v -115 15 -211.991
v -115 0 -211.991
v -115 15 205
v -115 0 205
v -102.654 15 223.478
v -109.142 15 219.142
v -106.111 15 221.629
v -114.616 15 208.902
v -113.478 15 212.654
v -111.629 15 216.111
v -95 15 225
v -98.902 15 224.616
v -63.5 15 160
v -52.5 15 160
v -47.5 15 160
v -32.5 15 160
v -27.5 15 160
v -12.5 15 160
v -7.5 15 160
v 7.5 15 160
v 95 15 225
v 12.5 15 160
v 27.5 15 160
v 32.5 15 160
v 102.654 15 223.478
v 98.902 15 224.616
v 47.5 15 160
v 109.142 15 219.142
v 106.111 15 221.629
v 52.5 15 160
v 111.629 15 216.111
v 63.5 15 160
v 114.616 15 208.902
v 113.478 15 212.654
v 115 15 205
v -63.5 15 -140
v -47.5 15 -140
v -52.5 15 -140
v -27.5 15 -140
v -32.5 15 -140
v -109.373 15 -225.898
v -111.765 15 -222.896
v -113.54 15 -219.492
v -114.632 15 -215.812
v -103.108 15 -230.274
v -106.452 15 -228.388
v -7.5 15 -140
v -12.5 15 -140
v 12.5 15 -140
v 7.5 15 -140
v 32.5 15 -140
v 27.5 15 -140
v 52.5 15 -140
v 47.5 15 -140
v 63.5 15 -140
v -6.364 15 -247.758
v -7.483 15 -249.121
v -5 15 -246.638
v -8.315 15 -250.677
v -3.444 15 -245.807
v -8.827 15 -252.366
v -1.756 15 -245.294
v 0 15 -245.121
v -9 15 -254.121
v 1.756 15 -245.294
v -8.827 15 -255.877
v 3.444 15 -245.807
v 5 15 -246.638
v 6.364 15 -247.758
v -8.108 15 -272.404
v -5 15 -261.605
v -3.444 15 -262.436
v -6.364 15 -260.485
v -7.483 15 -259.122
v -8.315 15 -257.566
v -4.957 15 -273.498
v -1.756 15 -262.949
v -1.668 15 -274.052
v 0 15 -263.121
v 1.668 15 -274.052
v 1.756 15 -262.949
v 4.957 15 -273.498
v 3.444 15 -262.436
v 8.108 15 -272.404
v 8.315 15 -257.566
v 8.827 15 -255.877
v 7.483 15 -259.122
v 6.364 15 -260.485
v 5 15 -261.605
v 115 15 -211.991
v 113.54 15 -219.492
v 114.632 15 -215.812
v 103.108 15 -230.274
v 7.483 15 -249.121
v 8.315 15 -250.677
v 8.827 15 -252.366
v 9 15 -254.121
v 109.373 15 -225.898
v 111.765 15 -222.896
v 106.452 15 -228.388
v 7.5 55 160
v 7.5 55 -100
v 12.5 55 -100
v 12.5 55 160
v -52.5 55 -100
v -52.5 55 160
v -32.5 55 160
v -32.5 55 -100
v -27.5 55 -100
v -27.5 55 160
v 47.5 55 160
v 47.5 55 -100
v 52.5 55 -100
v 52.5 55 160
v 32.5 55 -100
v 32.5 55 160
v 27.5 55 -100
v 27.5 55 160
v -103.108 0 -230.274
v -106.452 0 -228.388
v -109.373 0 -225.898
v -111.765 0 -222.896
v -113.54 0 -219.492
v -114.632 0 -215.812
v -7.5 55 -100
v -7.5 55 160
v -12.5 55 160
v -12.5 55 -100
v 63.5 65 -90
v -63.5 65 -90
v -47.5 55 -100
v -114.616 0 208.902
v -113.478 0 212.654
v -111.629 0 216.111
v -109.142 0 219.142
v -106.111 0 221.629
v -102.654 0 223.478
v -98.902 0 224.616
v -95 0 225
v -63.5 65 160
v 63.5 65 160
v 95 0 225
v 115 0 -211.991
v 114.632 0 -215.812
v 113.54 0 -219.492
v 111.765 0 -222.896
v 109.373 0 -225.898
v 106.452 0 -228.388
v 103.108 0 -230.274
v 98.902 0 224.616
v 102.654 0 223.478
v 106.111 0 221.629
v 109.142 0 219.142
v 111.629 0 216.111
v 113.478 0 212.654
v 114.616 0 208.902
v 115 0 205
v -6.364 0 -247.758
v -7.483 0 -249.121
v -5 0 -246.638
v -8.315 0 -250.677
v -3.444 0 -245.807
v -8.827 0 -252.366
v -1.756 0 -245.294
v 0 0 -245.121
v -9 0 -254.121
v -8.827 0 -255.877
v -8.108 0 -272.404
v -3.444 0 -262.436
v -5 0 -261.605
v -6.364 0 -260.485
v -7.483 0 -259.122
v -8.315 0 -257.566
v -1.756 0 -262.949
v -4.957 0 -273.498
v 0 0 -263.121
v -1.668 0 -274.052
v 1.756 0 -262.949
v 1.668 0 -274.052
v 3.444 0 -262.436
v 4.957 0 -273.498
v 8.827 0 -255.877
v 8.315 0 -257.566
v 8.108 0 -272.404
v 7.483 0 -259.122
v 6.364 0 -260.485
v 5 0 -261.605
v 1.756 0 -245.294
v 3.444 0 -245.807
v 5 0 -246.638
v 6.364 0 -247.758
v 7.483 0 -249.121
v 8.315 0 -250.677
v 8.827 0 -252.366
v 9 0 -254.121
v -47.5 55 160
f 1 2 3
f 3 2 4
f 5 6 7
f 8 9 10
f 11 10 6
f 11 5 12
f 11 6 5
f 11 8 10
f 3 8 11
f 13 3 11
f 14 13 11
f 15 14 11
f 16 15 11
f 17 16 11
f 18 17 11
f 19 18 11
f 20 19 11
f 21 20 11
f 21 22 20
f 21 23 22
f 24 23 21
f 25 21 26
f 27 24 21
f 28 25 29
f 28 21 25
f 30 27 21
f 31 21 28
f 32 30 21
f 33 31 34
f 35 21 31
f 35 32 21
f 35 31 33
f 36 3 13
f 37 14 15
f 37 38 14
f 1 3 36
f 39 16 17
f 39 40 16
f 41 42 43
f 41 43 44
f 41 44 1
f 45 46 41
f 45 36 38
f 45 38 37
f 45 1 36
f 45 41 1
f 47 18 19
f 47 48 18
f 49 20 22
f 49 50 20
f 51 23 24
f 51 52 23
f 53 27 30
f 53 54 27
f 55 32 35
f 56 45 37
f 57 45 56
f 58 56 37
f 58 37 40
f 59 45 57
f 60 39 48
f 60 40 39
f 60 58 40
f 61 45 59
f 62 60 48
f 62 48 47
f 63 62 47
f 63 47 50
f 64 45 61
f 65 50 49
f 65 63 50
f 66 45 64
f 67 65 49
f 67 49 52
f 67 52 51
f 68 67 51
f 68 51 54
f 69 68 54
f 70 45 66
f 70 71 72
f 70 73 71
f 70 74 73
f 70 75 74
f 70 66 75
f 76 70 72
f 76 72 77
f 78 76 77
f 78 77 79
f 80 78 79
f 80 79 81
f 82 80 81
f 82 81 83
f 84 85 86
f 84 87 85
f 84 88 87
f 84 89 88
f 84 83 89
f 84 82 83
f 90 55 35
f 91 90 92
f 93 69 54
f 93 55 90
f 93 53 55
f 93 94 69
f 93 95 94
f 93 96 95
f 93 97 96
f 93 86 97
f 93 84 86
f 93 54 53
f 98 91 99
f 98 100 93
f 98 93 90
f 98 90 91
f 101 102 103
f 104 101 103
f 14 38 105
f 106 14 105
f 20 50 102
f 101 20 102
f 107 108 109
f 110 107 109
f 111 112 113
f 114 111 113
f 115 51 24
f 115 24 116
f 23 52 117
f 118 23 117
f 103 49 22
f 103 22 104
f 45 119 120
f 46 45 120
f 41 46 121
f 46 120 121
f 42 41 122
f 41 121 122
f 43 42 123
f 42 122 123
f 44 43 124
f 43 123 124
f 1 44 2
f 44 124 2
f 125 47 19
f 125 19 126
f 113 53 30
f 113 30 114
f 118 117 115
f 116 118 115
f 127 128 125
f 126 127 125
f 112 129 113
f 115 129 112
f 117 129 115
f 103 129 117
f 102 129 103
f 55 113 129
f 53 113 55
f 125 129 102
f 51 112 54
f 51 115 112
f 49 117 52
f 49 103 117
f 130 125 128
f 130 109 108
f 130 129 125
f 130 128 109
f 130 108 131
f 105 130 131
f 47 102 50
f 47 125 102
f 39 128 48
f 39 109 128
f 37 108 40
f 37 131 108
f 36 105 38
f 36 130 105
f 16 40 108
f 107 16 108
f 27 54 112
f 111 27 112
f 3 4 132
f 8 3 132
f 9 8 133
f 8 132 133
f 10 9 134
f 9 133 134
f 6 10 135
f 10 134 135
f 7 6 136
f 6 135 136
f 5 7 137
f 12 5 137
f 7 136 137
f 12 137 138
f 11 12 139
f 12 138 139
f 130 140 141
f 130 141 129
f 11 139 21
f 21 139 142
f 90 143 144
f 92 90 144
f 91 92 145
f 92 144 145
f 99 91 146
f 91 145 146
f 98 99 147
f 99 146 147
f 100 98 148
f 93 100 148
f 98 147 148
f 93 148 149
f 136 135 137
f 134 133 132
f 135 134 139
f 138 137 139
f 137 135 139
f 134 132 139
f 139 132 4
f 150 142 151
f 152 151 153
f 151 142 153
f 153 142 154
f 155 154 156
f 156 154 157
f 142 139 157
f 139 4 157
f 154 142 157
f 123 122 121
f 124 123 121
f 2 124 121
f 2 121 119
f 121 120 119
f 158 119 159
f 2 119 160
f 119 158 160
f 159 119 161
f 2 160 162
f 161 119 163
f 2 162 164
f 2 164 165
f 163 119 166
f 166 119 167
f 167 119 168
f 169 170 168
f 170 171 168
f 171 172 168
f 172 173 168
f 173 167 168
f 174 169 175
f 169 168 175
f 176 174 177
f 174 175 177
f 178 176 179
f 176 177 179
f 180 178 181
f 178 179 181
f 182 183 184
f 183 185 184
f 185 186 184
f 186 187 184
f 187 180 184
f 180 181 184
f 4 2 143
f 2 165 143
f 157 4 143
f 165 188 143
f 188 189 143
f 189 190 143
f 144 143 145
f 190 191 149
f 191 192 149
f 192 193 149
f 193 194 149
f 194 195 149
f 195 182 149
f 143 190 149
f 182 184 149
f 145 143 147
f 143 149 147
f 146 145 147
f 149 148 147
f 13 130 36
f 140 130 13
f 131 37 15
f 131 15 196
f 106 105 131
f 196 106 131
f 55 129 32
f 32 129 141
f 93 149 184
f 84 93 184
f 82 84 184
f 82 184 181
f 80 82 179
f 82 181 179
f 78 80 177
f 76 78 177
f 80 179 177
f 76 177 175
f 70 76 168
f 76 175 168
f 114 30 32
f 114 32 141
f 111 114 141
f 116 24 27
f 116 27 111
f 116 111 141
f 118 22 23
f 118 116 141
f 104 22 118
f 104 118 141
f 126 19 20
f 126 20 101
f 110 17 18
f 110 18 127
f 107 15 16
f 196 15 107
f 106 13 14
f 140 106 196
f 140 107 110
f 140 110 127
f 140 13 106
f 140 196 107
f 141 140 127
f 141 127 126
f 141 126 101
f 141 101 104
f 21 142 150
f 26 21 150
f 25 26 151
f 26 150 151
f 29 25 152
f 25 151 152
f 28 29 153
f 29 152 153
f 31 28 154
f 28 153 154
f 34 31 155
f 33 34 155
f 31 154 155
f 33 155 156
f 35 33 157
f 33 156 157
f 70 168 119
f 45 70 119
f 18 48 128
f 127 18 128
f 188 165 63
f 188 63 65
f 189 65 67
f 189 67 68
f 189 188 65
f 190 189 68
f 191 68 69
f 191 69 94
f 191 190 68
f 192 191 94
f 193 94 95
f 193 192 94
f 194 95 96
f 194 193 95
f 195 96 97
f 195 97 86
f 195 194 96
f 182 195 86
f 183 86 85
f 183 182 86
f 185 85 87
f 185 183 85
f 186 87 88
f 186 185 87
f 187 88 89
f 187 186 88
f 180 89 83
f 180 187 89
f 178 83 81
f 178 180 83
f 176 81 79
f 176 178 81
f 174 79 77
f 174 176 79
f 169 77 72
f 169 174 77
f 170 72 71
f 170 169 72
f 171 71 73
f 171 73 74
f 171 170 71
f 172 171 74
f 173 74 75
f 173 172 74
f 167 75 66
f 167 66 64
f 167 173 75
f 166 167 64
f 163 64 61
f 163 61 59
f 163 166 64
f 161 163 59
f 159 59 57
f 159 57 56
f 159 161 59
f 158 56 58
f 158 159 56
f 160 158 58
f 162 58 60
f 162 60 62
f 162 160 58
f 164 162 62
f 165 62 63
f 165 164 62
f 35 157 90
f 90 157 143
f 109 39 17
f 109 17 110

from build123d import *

# Parameters (mm, degrees)
SKETCH1_R                = 9
BOSS_EXTRUDE1_DEPTH      = 15
BOSS_EXTRUDE2_DEPTH      = 63.5
BOSS_EXTRUDE2_DEPTH_BACK = 63.5
CUT_EXTRUDE1_DEPTH       = 200
CUT_EXTRUDE1_DEPTH_BACK  = 200
SKETCH4_W                = 5
SKETCH4_H                = 40


with BuildPart() as part:
    # Sketch1 → Boss-Extrude1 (new body)
    with BuildSketch(Plane(origin=(0, 0, 0), x_dir=(1, 0, 0), z_dir=(0, 1, 0))):
        with BuildLine():
            Line((-115, 211.991055507), (-115, -205))
            ThreePointArc((-115, -205), (-109.142135624, -219.142135624), (-95, -225))
            Line((-95, -225), (95, -225))
            ThreePointArc((95, -225), (109.142135624, -219.142135624), (115, -205))
            Line((115, -205), (115, 211.991055507))
            ThreePointArc((115, 211.991055507), (111.765445383, 222.896092926), (103.108015888, 230.273836432))
            Line((103.108015888, 230.273836432), (8.108015888, 272.404271215))
            ThreePointArc((8.108015888, 272.404271215), (0, 274.12149029), (-8.108015888, 272.404271215))
            Line((-8.108015888, 272.404271215), (-103.108015888, 230.273836432))
            ThreePointArc((-103.108015888, 230.273836432), (-111.765445383, 222.896092926), (-115, 211.991055507))
        make_face()
        with Locations(Location((0, 254.12149029, 0), (0, 0, 270))):
            Circle(SKETCH1_R, mode=Mode.SUBTRACT)
    extrude(amount=BOSS_EXTRUDE1_DEPTH)

    # Sketch2 → Boss-Extrude2 (add, two sides: drawn at the far end of the back side and taken through both)
    with BuildSketch(Plane(origin=(0, 0, 0), x_dir=(0, 0, -1), z_dir=(1, 0, 0)).offset(-BOSS_EXTRUDE2_DEPTH_BACK)):
        Polygon((-160, 15), (-160, 65), (90, 65), (140, 15), align=None)
    extrude(amount=BOSS_EXTRUDE2_DEPTH + BOSS_EXTRUDE2_DEPTH_BACK)

    # Sketch4 → Cut-Extrude1 (cut, two sides: drawn at the far end of the back side and taken through both)
    with BuildSketch(Plane.XY.offset(-CUT_EXTRUDE1_DEPTH_BACK)):
        with Locations((-50, 35)):
            Rectangle(SKETCH4_W, SKETCH4_H)
        with Locations((50, 35)):
            Rectangle(SKETCH4_W, SKETCH4_H)
        with Locations((30, 35)):
            Rectangle(SKETCH4_W, SKETCH4_H)
        with Locations((10, 35)):
            Rectangle(SKETCH4_W, SKETCH4_H)
        with Locations((-10, 35)):
            Rectangle(SKETCH4_W, SKETCH4_H)
        with Locations((-30, 35)):
            Rectangle(SKETCH4_W, SKETCH4_H)
    extrude(amount=CUT_EXTRUDE1_DEPTH + CUT_EXTRUDE1_DEPTH_BACK, mode=Mode.SUBTRACT)


solid = part.part
